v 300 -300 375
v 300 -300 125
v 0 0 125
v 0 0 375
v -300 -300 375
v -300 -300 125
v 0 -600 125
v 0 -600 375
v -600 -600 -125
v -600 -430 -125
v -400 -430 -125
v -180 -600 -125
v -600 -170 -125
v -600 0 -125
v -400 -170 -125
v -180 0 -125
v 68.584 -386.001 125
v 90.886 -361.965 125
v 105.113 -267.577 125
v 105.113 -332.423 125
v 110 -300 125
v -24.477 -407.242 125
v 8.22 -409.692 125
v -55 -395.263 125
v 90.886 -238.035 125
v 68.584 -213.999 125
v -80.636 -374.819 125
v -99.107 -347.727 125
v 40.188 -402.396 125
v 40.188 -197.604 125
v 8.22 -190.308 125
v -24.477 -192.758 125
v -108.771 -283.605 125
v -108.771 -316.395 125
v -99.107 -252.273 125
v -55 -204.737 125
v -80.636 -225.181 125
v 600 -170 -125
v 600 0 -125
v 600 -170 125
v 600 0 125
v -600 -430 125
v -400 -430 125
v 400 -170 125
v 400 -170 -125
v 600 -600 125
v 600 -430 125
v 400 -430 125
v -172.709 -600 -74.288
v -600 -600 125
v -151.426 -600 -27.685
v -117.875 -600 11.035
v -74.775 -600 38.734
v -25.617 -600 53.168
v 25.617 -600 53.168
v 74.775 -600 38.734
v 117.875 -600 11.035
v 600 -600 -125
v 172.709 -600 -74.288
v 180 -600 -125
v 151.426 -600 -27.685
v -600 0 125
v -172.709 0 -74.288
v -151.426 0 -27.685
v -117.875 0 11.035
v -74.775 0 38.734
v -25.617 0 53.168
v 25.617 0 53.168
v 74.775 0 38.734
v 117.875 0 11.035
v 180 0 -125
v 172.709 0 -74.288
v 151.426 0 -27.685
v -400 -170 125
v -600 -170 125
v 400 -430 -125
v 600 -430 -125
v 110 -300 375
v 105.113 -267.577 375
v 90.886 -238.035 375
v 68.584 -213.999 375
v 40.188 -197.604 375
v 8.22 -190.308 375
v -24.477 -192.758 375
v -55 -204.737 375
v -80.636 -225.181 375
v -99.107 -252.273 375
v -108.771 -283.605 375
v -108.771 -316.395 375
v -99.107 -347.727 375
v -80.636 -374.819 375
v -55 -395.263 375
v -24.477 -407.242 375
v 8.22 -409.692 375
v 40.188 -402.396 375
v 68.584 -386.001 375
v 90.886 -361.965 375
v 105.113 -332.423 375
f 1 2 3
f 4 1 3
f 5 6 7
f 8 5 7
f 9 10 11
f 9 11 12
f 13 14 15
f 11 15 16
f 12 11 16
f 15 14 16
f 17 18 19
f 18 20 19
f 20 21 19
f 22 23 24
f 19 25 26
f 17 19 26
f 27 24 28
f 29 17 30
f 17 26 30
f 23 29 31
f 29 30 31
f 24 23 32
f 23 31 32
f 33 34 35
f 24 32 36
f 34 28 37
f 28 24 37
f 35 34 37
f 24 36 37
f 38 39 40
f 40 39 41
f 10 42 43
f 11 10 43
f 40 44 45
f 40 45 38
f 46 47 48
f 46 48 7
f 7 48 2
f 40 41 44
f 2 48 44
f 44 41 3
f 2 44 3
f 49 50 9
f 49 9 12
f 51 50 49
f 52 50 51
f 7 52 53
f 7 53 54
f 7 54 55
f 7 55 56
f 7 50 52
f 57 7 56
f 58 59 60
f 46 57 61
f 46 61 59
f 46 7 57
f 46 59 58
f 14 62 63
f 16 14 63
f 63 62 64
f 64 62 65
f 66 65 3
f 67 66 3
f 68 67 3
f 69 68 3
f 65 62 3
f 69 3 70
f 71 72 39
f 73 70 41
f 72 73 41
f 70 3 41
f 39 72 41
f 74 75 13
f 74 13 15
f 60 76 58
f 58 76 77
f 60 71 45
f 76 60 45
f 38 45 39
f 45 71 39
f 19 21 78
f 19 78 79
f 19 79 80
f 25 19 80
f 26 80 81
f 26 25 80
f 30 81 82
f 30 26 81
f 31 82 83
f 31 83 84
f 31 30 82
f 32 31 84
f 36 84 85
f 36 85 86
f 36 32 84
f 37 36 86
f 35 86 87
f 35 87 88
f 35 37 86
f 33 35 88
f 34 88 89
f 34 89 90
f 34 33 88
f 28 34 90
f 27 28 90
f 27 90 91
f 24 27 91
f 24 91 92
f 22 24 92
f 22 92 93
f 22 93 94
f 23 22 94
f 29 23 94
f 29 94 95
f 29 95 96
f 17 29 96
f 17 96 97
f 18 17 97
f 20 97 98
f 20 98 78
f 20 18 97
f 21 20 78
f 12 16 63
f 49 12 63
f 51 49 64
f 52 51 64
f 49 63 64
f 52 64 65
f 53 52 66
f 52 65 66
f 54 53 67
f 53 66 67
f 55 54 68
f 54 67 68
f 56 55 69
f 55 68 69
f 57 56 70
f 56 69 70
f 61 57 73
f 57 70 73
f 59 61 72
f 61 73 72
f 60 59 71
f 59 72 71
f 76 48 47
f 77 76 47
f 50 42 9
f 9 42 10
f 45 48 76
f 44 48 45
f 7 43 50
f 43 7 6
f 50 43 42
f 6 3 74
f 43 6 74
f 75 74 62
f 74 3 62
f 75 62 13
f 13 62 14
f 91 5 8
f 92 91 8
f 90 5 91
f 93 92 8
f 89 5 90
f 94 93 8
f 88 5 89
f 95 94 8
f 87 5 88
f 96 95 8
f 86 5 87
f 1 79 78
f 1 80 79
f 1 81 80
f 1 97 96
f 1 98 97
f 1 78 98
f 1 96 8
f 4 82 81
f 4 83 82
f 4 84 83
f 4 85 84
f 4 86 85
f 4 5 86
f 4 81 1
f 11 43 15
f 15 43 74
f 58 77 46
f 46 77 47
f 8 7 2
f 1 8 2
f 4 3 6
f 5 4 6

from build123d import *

# Parameters (mm, degrees)
F1_DEPTH = 600
F2_W     = 200
F2_H     = 260
F3_DEPTH = 250.001
F4_R     = 110
F5_DEPTH = 250


with BuildPart() as f1:
    # F0 (on Front) → F1 (new body)
    with BuildSketch(Plane.XZ):
        with BuildLine():
            Line((600, 125), (-600, 125))
            Line((-600, 125), (-600, -125))
            Line((-600, -125), (-180, -125))
            ThreePointArc((-180, -125), (0, 55), (180, -125))
            Line((180, -125), (600, -125))
            Line((600, -125), (600, 125))
        make_face()
    extrude(amount=F1_DEPTH)

    # F2 (on face) → F3 (cut, through all)
    with BuildSketch(Plane.XY.offset(125)):
        with Locations((-500, -300)):
            Rectangle(F2_W, F2_H)
        with Locations((500, -300)):
            Rectangle(F2_W, F2_H)
    extrude(amount=-F3_DEPTH, mode=Mode.SUBTRACT)

    # F4 (on face) → F5 (join)
    with BuildSketch(Plane.XY.offset(125)):
        Polygon((300, -300), (0, 0), (-300, -300), (0, -600), align=None)
        with Locations((0, -300)):
            Circle(F4_R, mode=Mode.SUBTRACT)
    extrude(amount=F5_DEPTH)


solid = f1.part
